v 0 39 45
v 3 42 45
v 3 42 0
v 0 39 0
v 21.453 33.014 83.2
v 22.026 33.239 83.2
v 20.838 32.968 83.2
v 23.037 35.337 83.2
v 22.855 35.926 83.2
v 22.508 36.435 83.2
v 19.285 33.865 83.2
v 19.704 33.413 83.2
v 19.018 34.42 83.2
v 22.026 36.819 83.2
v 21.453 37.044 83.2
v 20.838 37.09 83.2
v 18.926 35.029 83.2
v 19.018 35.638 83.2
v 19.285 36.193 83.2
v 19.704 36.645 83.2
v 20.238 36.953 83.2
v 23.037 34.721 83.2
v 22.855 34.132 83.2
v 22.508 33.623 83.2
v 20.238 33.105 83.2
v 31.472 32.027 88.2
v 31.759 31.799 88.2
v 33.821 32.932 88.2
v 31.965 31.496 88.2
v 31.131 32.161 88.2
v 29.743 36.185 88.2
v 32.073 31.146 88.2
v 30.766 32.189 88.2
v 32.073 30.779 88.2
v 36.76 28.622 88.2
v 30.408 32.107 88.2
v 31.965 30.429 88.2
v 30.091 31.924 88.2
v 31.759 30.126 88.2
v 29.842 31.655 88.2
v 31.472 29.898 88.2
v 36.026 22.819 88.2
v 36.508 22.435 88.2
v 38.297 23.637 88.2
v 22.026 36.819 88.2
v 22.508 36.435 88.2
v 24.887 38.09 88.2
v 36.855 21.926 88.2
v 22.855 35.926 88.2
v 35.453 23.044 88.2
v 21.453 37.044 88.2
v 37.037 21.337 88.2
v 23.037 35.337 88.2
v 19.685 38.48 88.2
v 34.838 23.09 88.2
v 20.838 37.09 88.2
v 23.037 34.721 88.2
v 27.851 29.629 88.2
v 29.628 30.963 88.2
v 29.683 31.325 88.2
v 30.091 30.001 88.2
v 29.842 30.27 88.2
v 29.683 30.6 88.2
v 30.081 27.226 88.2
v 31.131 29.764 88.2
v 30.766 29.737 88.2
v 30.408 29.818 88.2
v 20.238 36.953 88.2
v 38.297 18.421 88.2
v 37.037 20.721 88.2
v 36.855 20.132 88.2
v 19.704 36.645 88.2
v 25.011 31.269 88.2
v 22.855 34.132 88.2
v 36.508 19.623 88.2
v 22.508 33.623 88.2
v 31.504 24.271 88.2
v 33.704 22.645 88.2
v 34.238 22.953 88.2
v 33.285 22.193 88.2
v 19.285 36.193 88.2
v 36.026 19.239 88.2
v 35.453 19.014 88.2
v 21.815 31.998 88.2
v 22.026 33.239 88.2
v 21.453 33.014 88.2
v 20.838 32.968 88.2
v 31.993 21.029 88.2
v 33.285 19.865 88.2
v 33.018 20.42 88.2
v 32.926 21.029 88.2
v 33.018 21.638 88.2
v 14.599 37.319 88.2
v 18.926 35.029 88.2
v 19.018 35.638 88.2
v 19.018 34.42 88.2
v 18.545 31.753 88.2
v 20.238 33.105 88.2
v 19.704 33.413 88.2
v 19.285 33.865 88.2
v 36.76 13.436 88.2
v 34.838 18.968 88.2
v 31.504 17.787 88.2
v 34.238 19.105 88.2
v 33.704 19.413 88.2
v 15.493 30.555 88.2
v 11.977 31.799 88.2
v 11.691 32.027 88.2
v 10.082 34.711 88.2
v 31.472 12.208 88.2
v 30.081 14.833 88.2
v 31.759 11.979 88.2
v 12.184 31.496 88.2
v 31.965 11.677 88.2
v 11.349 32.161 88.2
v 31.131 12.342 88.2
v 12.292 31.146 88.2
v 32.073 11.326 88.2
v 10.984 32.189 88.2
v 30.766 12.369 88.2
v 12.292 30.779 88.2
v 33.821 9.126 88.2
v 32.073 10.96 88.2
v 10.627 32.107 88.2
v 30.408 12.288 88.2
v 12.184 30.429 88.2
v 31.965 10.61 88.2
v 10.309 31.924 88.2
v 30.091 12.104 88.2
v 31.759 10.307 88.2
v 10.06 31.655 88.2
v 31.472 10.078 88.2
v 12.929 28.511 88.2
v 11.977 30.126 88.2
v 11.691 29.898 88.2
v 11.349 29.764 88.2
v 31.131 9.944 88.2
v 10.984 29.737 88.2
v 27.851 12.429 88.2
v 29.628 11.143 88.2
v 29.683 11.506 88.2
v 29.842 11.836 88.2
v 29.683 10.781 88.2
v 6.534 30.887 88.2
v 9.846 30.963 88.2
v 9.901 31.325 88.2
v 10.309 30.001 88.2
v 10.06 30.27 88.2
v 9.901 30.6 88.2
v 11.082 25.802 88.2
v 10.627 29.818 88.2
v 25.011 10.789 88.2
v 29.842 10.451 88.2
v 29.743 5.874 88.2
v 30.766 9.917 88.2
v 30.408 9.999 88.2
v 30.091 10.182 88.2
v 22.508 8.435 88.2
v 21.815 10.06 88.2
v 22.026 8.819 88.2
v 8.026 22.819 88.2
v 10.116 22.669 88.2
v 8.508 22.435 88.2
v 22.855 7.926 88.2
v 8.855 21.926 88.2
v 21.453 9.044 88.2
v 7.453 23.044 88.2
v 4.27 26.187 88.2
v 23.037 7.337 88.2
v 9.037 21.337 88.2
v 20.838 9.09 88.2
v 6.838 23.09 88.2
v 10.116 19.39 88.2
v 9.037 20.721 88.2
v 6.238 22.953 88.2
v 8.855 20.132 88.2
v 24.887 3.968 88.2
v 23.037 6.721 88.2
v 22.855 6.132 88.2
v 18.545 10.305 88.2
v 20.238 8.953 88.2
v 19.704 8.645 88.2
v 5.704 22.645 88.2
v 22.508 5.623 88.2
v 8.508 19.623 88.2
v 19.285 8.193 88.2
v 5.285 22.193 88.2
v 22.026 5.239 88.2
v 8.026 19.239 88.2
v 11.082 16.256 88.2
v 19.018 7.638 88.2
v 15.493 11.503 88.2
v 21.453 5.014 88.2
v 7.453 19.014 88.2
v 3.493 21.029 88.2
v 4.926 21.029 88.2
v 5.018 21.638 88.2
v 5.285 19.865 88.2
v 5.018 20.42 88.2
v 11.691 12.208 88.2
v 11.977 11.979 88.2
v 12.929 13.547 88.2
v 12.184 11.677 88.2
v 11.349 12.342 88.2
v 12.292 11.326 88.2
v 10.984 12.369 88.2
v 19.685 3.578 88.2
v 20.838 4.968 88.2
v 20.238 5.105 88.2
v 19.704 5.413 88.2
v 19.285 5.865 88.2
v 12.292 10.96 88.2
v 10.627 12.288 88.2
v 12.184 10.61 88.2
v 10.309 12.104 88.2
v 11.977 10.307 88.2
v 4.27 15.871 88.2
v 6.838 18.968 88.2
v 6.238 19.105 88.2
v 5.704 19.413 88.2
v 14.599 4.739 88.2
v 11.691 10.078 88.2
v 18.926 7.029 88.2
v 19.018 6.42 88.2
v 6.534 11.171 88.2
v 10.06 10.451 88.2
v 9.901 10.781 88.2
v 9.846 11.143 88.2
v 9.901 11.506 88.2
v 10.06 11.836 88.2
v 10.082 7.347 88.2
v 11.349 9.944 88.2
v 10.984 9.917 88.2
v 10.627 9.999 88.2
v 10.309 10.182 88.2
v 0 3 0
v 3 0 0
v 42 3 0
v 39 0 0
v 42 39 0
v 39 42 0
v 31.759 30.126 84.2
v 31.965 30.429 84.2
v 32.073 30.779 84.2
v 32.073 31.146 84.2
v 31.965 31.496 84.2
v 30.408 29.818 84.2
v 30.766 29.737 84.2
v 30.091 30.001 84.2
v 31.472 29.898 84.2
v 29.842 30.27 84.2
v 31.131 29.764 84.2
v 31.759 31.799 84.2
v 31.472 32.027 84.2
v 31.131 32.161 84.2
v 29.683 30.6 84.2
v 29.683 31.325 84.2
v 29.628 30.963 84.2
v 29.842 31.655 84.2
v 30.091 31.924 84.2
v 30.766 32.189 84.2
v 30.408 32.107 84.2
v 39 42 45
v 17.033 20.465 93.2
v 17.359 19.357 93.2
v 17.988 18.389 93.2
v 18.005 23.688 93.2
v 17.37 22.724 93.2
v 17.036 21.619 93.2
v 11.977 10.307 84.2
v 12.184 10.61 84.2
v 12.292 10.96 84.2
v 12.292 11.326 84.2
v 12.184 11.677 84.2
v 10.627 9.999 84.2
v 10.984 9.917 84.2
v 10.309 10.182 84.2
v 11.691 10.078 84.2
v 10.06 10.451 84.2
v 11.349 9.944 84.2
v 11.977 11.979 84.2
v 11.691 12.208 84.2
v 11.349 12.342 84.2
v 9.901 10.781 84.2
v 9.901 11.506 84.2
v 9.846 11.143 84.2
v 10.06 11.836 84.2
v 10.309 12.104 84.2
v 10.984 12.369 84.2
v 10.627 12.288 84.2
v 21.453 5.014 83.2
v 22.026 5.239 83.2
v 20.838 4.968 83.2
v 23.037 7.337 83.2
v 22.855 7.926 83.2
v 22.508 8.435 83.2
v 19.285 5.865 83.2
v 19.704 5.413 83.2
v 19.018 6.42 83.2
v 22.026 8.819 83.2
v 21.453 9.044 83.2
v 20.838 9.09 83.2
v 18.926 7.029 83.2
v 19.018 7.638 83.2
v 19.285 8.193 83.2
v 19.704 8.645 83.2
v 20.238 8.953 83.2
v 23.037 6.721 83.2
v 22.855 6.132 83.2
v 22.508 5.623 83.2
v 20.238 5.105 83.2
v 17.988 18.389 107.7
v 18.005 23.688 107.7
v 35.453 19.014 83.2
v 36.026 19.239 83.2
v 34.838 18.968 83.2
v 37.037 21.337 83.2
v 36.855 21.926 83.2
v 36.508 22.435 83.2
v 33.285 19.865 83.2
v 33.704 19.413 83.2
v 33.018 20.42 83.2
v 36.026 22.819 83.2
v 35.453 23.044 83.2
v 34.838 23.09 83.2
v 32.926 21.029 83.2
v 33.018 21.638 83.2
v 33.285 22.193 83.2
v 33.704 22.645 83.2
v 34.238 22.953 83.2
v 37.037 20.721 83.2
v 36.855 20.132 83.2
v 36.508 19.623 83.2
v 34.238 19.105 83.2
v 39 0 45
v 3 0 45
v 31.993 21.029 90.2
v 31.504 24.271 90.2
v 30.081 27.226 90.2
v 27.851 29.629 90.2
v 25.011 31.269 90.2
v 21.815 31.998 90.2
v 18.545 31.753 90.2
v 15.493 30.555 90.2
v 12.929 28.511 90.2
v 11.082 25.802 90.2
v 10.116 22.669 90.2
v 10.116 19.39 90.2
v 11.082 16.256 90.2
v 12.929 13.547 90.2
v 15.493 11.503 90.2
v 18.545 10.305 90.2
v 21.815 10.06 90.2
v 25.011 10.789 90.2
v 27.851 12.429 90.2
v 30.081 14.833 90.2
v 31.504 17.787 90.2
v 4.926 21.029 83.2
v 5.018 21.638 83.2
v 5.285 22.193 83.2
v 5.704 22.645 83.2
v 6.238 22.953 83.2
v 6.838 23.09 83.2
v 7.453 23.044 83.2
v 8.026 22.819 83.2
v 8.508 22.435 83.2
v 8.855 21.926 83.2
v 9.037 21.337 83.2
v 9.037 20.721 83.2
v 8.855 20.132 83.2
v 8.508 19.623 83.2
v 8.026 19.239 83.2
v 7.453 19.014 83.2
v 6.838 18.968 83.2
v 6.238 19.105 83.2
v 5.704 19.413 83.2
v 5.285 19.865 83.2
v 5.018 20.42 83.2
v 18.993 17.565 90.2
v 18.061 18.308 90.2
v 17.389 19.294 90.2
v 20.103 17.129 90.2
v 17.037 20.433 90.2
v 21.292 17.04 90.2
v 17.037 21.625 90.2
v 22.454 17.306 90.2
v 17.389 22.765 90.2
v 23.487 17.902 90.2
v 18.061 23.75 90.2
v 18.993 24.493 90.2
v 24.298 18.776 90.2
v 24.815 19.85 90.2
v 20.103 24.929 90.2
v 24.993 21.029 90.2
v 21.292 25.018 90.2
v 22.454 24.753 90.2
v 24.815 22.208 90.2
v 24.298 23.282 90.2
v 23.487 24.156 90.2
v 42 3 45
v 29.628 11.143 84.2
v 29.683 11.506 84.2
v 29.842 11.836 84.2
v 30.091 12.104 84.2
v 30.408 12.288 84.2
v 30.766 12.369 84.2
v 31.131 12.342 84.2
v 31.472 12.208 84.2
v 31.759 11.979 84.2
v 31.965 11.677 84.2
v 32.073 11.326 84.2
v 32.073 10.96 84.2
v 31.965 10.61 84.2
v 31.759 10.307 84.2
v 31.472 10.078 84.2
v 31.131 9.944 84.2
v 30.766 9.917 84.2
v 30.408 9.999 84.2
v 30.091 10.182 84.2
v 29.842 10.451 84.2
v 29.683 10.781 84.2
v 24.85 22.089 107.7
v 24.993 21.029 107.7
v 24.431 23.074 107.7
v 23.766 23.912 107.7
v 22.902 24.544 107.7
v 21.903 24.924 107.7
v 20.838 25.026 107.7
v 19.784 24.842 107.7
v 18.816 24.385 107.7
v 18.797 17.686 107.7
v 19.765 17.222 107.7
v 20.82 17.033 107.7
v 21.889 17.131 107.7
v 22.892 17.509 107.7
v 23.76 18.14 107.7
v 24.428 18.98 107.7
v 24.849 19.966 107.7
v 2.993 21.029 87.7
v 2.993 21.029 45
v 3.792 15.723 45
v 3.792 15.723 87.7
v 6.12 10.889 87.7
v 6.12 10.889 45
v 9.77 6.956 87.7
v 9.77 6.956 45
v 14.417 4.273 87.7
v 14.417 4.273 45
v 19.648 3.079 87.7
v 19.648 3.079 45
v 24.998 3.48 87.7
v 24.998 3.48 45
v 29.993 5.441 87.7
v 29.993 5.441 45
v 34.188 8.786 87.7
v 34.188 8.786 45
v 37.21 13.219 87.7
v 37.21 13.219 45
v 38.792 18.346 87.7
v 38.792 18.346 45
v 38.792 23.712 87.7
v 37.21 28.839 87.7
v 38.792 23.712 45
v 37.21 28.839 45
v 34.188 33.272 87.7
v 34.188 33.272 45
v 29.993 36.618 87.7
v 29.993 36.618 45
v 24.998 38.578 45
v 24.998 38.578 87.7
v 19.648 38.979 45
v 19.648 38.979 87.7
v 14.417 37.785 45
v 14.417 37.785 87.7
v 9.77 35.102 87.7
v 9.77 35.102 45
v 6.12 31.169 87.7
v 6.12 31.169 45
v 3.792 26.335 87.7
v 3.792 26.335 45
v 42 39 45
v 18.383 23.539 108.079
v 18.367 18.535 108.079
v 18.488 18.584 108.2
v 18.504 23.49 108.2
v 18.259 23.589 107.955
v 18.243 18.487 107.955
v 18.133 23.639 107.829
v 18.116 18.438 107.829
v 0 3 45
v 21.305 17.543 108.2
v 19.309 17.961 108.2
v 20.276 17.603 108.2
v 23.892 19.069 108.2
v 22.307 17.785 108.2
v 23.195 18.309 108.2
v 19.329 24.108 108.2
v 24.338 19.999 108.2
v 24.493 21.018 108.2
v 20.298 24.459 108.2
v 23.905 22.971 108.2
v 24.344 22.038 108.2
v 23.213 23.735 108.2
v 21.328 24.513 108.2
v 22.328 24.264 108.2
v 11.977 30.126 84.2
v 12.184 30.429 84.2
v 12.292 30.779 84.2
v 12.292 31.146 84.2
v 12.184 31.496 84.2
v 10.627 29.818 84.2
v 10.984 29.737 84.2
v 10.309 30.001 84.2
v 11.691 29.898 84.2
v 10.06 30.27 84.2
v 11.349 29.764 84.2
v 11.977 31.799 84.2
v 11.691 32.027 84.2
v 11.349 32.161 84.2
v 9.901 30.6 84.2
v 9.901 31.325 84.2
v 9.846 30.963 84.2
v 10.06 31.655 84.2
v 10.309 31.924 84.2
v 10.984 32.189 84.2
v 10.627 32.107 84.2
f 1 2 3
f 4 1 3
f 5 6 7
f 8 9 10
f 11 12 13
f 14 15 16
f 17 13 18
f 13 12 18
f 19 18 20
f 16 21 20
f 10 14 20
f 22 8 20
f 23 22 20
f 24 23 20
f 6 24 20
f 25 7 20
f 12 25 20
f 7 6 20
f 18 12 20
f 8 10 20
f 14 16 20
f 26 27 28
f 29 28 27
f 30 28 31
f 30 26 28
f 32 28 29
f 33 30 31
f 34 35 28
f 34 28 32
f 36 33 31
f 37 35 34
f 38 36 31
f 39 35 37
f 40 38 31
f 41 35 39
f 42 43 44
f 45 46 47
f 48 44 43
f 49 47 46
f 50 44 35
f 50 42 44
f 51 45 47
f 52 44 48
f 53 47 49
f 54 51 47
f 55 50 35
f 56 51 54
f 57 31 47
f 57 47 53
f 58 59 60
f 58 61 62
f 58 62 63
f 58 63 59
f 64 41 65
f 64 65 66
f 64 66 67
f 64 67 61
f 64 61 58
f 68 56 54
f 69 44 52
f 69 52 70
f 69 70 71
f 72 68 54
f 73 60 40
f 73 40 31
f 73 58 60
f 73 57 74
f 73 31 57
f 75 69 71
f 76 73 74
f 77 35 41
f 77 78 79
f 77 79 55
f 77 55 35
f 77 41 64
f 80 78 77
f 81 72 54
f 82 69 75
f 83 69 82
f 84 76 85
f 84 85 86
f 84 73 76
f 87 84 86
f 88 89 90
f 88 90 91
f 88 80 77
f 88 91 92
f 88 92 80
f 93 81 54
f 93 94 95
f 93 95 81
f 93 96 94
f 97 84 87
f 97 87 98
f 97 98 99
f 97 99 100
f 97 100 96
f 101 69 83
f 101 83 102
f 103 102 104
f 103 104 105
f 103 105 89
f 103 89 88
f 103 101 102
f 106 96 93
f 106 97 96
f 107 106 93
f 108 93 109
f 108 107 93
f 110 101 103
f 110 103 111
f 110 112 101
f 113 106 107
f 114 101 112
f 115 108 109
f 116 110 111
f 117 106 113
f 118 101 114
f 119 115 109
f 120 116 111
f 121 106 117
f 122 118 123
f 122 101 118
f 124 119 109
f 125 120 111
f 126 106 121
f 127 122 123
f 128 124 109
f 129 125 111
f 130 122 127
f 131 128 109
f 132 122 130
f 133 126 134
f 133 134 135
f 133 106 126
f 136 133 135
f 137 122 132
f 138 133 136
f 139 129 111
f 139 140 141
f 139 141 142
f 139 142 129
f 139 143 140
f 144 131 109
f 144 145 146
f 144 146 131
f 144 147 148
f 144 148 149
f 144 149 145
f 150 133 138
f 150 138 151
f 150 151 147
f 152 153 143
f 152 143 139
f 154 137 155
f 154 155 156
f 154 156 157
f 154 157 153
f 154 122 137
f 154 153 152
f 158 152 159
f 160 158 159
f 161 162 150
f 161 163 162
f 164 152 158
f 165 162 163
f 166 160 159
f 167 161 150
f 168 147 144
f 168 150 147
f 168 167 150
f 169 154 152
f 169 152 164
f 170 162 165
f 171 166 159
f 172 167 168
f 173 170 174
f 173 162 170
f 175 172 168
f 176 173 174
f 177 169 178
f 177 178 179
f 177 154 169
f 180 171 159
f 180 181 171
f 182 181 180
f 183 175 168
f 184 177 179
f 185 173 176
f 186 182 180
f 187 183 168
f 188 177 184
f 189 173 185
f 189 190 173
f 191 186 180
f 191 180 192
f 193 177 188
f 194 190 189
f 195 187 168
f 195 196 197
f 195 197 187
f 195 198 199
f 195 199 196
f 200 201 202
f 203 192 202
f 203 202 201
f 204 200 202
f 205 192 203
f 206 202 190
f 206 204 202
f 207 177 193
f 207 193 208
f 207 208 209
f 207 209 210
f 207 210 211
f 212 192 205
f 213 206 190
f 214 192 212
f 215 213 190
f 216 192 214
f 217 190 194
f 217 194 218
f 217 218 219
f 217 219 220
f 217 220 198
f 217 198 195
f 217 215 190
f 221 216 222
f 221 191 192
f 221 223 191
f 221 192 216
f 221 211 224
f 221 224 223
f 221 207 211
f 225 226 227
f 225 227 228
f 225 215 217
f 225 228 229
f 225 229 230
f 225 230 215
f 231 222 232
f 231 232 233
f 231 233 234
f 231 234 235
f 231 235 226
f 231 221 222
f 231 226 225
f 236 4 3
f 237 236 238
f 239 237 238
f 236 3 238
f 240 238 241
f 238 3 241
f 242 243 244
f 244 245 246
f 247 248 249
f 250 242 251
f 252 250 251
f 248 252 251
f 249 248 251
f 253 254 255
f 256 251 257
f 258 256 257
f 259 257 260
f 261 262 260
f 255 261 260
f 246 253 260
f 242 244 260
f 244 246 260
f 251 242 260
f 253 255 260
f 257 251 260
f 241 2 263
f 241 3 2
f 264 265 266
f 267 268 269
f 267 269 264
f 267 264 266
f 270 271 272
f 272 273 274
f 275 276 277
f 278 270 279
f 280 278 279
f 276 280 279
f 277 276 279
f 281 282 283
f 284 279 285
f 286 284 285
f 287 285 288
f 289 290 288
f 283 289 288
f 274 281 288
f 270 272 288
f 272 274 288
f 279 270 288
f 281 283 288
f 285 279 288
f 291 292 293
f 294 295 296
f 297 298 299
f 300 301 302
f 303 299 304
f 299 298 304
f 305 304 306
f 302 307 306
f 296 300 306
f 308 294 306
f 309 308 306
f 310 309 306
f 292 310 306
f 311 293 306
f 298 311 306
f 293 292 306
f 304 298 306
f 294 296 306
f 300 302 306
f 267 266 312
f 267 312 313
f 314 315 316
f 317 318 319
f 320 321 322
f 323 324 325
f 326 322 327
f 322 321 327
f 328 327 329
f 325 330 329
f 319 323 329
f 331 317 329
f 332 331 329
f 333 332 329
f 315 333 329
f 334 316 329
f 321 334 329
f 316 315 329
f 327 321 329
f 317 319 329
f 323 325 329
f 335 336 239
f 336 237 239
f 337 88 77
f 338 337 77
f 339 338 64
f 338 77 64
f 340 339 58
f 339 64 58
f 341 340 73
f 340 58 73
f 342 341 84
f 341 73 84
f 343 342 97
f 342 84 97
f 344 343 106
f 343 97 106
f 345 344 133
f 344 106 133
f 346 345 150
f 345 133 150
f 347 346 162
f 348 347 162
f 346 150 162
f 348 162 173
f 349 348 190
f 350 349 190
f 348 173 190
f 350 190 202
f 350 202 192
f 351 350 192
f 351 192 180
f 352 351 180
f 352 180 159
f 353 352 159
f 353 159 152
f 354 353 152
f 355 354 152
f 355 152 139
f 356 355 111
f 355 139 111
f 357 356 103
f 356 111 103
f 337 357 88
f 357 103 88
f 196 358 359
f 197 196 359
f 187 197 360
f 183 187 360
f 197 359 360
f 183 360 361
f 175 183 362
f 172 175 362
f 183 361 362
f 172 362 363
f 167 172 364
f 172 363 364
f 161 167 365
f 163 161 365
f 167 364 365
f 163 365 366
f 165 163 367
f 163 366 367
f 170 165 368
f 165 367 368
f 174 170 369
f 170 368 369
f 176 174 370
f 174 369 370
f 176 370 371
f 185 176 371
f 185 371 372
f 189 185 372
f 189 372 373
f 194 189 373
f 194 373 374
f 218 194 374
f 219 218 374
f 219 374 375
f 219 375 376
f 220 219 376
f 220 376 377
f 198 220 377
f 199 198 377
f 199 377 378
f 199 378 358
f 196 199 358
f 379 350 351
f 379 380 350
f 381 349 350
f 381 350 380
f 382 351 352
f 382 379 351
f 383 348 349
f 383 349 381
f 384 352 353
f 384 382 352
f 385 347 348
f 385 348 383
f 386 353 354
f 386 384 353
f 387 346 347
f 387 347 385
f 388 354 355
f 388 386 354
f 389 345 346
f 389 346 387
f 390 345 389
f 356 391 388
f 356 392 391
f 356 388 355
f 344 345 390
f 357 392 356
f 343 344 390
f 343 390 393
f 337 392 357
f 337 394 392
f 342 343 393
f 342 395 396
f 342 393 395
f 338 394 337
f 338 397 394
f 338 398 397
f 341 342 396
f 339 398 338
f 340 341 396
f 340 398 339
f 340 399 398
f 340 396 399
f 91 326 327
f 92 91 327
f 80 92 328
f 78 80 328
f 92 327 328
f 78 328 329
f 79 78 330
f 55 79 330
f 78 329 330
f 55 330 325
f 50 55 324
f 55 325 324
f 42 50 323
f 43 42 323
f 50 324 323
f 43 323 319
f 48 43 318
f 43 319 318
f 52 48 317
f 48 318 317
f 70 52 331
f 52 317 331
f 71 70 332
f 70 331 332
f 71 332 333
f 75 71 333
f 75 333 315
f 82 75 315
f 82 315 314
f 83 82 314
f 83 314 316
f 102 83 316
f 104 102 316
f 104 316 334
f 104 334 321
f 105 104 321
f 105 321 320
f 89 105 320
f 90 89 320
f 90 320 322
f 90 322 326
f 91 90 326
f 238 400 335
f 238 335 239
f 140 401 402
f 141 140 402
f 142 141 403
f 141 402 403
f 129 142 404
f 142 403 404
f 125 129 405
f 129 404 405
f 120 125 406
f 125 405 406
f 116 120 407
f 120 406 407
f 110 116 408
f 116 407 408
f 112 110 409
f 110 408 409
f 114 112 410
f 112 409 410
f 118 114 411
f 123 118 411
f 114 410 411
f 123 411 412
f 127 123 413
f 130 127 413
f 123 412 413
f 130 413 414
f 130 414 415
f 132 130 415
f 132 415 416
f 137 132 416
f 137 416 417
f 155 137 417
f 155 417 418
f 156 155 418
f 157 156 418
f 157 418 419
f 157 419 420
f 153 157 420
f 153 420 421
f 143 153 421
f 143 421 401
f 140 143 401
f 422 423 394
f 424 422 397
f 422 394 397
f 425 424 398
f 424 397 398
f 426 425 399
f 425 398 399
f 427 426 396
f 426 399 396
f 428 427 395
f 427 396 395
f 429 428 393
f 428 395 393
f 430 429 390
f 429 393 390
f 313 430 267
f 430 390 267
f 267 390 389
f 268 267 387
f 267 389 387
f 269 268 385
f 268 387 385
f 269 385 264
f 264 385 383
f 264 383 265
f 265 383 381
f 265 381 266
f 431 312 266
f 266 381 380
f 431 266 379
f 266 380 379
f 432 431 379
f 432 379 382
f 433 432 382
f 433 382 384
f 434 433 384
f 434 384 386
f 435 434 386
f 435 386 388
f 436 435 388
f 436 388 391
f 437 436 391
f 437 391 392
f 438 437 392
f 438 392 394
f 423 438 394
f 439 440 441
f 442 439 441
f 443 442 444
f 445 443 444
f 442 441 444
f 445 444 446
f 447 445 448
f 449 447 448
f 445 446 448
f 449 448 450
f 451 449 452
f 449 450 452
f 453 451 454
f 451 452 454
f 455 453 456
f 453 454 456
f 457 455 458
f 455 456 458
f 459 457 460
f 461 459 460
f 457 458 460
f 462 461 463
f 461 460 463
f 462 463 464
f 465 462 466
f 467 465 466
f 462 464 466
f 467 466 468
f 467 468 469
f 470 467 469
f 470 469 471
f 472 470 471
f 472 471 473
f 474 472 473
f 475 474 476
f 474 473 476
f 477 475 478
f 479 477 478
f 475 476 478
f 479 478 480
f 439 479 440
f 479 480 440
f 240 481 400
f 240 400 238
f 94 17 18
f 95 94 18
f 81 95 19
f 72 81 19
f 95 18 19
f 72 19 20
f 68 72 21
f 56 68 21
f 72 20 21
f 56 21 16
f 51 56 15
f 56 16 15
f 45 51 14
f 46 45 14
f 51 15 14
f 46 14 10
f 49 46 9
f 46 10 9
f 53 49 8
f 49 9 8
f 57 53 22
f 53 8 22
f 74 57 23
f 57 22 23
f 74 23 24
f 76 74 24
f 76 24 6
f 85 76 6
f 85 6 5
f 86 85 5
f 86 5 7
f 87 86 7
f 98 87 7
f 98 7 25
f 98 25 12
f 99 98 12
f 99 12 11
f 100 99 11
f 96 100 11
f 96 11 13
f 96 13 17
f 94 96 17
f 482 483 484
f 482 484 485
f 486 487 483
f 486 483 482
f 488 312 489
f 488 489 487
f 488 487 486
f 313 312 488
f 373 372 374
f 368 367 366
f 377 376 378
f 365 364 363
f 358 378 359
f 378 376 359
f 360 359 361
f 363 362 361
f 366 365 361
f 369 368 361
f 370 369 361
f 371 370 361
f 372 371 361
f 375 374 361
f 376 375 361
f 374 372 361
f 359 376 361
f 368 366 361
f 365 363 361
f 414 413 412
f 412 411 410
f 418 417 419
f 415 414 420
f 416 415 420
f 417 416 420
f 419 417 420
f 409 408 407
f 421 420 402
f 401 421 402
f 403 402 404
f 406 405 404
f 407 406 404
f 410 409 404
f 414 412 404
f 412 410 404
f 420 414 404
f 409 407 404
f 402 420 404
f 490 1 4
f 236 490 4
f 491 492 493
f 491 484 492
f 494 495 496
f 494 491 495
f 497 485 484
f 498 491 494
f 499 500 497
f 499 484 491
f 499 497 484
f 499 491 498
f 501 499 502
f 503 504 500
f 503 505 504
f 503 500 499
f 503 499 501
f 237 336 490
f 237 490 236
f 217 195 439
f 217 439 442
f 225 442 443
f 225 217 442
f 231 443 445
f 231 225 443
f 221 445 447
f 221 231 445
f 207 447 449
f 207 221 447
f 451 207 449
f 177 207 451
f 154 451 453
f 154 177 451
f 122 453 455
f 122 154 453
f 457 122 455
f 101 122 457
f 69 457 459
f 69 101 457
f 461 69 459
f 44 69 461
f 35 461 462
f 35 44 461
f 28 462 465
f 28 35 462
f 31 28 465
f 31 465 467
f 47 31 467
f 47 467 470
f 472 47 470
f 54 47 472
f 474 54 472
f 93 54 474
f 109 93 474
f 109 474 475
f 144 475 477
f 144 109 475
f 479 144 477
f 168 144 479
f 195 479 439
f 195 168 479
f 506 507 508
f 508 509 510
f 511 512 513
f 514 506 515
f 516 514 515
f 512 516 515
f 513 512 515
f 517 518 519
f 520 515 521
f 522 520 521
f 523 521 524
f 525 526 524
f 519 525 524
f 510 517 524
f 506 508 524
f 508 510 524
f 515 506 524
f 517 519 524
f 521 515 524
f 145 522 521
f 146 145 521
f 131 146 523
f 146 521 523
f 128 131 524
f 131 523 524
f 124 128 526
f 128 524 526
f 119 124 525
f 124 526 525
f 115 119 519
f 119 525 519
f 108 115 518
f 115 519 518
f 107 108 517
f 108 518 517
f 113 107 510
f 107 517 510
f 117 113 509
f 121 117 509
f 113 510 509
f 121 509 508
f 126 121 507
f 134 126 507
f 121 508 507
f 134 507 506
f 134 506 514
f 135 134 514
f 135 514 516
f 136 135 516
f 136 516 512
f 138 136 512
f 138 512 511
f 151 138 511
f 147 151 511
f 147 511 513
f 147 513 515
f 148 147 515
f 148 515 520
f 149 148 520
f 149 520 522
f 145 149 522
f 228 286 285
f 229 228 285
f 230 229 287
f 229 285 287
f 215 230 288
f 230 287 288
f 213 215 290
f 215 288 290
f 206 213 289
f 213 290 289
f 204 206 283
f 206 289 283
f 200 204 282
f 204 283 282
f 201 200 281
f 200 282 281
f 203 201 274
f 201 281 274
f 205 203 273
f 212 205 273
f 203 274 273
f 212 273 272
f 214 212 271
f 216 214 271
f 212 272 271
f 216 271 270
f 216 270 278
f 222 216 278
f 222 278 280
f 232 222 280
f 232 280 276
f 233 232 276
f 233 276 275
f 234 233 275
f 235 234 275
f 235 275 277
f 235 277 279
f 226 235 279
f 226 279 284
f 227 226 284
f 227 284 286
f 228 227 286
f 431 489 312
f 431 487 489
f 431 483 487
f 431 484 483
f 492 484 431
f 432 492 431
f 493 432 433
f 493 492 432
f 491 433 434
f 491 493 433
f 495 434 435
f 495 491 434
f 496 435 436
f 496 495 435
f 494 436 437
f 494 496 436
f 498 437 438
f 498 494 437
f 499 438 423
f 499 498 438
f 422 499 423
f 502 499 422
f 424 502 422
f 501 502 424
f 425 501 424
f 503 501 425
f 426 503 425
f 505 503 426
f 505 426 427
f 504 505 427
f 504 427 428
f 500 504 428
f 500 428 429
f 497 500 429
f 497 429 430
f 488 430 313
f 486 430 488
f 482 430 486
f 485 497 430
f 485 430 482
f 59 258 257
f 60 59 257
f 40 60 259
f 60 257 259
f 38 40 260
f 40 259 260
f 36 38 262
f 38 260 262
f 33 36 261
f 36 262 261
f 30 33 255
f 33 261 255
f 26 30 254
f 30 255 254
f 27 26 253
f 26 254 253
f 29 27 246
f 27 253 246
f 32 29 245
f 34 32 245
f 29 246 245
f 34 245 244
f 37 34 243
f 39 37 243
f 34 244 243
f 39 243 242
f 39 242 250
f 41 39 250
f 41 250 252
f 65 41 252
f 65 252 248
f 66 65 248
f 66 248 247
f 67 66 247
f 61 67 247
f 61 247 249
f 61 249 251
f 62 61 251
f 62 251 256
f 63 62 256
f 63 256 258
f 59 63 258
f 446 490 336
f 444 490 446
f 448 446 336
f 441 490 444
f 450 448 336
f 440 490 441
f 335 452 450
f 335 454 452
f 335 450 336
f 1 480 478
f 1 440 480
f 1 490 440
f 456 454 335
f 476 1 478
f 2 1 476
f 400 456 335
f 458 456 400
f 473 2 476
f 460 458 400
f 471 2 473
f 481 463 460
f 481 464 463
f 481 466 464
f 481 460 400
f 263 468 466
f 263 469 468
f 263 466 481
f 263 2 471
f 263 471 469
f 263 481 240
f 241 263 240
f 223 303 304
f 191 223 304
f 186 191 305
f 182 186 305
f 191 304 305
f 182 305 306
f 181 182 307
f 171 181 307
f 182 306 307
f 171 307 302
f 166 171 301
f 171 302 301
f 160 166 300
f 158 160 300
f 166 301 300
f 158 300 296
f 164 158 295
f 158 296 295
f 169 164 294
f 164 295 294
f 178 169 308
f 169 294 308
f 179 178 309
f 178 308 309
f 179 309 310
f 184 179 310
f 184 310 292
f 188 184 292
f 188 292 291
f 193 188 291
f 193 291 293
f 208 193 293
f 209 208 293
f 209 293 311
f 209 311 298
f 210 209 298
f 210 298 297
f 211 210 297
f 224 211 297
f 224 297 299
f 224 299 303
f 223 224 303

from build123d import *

# Parameters (mm, degrees)
SKETCH1_W                  = 42
SKETCH1_H                  = 45
BOSS_EXTRUDE1_DEPTH        = 42
SKETCH2_R                  = 18
BOSS_EXTRUDE2_DEPTH        = 43.2
SKETCH3_R                  = 11
BOSS_EXTRUDE3_DEPTH        = 2
SKETCH4_R                  = 4
BOSS_EXTRUDE4_DEPTH        = 18
CUT_EXTRUDE1_START         = -15
CUT_EXTRUDE1_DEPTH         = 15
M2_CLEARANCE_HOLE1_D       = 2.459
M2_CLEARANCE_HOLE1_DEPTH   = 4
M3_5_CLEARANCE_HOLE1_D     = 4.134
M3_5_CLEARANCE_HOLE1_DEPTH = 5
CHAMFER1_SIZE              = 3
CHAMFER2_SIZE              = 0.5


with BuildPart() as part:
    # Sketch1 → Boss-Extrude1 (new body)
    with BuildSketch(Plane(origin=(0, 42, 0), x_dir=(1, 0, 0), z_dir=(0, 1, 0))):
        with Locations((21, -22.5)):
            Rectangle(SKETCH1_W, SKETCH1_H)
    extrude(amount=-BOSS_EXTRUDE1_DEPTH)

    # Sketch2 → Boss-Extrude2 (add)
    with BuildSketch(Plane.XY.offset(45)):
        with Locations(Location((20.992732048, 21.029062271, 0), (0, 0, 180))):
            Circle(SKETCH2_R)
    extrude(amount=BOSS_EXTRUDE2_DEPTH)

    # Sketch3 → Boss-Extrude3 (add)
    with BuildSketch(Plane.XY.offset(88.2)):
        with Locations((20.992732048, 21.029062271)):
            Circle(SKETCH3_R)
    extrude(amount=BOSS_EXTRUDE3_DEPTH)

    # Sketch4 → Boss-Extrude4 (add)
    with BuildSketch(Plane.XY.offset(90.2)):
        with Locations((20.992732048, 21.029062271)):
            Circle(SKETCH4_R)
    extrude(amount=BOSS_EXTRUDE4_DEPTH)

    # Sketch5 → Cut-Extrude1 (cut)
    with BuildSketch(Plane.XY.offset(108.2).offset(CUT_EXTRUDE1_START)):
        with BuildLine():
            Line((17.987520214, 18.389232384), (18.004545147, 23.688148401))
            ThreePointArc((18.004545147, 23.688148401), (16.992752693, 21.041913839), (17.987520214, 18.389232384))
        make_face()
    extrude(amount=CUT_EXTRUDE1_DEPTH, mode=Mode.SUBTRACT)

    # M2 Clearance Hole1
    with Locations(Plane.XY.offset(88.2)):
        with Locations((11.075764894, 30.962638855), (30.85750103, 30.962638855), (11.075764894, 11.143120527), (30.85750103, 11.143120527)):
            Hole(M2_CLEARANCE_HOLE1_D / 2, depth=M2_CLEARANCE_HOLE1_DEPTH)

    # M3.5 Clearance Hole1
    with Locations(Plane.XY.offset(88.2)):
        with Locations((6.992732048, 21.029062271), (34.992732048, 21.029062271), (20.992732048, 7.029062271), (20.992732048, 35.029062271)):
            Hole(M3_5_CLEARANCE_HOLE1_D / 2, depth=M3_5_CLEARANCE_HOLE1_DEPTH)

    # Chamfer1
    chamfer1_edges = [part.edges().sort_by_distance(p)[0] for p in [
        (0, 0, 22.5),
        (42, 0, 22.5),
        (0, 42, 22.5),
        (42, 42, 22.5),
    ]]
    chamfer(chamfer1_edges, length=CHAMFER1_SIZE)

    # Chamfer2
    chamfer2_edges = [part.edges().sort_by_distance(p)[0] for p in [
        (38.992732048, 21.029062271, 88.2),
        (22.403255473, 17.286012222, 108.2),
        (17.996032681, 21.038690392, 108.2),
    ]]
    chamfer(chamfer2_edges, length=CHAMFER2_SIZE)


solid = part.part
